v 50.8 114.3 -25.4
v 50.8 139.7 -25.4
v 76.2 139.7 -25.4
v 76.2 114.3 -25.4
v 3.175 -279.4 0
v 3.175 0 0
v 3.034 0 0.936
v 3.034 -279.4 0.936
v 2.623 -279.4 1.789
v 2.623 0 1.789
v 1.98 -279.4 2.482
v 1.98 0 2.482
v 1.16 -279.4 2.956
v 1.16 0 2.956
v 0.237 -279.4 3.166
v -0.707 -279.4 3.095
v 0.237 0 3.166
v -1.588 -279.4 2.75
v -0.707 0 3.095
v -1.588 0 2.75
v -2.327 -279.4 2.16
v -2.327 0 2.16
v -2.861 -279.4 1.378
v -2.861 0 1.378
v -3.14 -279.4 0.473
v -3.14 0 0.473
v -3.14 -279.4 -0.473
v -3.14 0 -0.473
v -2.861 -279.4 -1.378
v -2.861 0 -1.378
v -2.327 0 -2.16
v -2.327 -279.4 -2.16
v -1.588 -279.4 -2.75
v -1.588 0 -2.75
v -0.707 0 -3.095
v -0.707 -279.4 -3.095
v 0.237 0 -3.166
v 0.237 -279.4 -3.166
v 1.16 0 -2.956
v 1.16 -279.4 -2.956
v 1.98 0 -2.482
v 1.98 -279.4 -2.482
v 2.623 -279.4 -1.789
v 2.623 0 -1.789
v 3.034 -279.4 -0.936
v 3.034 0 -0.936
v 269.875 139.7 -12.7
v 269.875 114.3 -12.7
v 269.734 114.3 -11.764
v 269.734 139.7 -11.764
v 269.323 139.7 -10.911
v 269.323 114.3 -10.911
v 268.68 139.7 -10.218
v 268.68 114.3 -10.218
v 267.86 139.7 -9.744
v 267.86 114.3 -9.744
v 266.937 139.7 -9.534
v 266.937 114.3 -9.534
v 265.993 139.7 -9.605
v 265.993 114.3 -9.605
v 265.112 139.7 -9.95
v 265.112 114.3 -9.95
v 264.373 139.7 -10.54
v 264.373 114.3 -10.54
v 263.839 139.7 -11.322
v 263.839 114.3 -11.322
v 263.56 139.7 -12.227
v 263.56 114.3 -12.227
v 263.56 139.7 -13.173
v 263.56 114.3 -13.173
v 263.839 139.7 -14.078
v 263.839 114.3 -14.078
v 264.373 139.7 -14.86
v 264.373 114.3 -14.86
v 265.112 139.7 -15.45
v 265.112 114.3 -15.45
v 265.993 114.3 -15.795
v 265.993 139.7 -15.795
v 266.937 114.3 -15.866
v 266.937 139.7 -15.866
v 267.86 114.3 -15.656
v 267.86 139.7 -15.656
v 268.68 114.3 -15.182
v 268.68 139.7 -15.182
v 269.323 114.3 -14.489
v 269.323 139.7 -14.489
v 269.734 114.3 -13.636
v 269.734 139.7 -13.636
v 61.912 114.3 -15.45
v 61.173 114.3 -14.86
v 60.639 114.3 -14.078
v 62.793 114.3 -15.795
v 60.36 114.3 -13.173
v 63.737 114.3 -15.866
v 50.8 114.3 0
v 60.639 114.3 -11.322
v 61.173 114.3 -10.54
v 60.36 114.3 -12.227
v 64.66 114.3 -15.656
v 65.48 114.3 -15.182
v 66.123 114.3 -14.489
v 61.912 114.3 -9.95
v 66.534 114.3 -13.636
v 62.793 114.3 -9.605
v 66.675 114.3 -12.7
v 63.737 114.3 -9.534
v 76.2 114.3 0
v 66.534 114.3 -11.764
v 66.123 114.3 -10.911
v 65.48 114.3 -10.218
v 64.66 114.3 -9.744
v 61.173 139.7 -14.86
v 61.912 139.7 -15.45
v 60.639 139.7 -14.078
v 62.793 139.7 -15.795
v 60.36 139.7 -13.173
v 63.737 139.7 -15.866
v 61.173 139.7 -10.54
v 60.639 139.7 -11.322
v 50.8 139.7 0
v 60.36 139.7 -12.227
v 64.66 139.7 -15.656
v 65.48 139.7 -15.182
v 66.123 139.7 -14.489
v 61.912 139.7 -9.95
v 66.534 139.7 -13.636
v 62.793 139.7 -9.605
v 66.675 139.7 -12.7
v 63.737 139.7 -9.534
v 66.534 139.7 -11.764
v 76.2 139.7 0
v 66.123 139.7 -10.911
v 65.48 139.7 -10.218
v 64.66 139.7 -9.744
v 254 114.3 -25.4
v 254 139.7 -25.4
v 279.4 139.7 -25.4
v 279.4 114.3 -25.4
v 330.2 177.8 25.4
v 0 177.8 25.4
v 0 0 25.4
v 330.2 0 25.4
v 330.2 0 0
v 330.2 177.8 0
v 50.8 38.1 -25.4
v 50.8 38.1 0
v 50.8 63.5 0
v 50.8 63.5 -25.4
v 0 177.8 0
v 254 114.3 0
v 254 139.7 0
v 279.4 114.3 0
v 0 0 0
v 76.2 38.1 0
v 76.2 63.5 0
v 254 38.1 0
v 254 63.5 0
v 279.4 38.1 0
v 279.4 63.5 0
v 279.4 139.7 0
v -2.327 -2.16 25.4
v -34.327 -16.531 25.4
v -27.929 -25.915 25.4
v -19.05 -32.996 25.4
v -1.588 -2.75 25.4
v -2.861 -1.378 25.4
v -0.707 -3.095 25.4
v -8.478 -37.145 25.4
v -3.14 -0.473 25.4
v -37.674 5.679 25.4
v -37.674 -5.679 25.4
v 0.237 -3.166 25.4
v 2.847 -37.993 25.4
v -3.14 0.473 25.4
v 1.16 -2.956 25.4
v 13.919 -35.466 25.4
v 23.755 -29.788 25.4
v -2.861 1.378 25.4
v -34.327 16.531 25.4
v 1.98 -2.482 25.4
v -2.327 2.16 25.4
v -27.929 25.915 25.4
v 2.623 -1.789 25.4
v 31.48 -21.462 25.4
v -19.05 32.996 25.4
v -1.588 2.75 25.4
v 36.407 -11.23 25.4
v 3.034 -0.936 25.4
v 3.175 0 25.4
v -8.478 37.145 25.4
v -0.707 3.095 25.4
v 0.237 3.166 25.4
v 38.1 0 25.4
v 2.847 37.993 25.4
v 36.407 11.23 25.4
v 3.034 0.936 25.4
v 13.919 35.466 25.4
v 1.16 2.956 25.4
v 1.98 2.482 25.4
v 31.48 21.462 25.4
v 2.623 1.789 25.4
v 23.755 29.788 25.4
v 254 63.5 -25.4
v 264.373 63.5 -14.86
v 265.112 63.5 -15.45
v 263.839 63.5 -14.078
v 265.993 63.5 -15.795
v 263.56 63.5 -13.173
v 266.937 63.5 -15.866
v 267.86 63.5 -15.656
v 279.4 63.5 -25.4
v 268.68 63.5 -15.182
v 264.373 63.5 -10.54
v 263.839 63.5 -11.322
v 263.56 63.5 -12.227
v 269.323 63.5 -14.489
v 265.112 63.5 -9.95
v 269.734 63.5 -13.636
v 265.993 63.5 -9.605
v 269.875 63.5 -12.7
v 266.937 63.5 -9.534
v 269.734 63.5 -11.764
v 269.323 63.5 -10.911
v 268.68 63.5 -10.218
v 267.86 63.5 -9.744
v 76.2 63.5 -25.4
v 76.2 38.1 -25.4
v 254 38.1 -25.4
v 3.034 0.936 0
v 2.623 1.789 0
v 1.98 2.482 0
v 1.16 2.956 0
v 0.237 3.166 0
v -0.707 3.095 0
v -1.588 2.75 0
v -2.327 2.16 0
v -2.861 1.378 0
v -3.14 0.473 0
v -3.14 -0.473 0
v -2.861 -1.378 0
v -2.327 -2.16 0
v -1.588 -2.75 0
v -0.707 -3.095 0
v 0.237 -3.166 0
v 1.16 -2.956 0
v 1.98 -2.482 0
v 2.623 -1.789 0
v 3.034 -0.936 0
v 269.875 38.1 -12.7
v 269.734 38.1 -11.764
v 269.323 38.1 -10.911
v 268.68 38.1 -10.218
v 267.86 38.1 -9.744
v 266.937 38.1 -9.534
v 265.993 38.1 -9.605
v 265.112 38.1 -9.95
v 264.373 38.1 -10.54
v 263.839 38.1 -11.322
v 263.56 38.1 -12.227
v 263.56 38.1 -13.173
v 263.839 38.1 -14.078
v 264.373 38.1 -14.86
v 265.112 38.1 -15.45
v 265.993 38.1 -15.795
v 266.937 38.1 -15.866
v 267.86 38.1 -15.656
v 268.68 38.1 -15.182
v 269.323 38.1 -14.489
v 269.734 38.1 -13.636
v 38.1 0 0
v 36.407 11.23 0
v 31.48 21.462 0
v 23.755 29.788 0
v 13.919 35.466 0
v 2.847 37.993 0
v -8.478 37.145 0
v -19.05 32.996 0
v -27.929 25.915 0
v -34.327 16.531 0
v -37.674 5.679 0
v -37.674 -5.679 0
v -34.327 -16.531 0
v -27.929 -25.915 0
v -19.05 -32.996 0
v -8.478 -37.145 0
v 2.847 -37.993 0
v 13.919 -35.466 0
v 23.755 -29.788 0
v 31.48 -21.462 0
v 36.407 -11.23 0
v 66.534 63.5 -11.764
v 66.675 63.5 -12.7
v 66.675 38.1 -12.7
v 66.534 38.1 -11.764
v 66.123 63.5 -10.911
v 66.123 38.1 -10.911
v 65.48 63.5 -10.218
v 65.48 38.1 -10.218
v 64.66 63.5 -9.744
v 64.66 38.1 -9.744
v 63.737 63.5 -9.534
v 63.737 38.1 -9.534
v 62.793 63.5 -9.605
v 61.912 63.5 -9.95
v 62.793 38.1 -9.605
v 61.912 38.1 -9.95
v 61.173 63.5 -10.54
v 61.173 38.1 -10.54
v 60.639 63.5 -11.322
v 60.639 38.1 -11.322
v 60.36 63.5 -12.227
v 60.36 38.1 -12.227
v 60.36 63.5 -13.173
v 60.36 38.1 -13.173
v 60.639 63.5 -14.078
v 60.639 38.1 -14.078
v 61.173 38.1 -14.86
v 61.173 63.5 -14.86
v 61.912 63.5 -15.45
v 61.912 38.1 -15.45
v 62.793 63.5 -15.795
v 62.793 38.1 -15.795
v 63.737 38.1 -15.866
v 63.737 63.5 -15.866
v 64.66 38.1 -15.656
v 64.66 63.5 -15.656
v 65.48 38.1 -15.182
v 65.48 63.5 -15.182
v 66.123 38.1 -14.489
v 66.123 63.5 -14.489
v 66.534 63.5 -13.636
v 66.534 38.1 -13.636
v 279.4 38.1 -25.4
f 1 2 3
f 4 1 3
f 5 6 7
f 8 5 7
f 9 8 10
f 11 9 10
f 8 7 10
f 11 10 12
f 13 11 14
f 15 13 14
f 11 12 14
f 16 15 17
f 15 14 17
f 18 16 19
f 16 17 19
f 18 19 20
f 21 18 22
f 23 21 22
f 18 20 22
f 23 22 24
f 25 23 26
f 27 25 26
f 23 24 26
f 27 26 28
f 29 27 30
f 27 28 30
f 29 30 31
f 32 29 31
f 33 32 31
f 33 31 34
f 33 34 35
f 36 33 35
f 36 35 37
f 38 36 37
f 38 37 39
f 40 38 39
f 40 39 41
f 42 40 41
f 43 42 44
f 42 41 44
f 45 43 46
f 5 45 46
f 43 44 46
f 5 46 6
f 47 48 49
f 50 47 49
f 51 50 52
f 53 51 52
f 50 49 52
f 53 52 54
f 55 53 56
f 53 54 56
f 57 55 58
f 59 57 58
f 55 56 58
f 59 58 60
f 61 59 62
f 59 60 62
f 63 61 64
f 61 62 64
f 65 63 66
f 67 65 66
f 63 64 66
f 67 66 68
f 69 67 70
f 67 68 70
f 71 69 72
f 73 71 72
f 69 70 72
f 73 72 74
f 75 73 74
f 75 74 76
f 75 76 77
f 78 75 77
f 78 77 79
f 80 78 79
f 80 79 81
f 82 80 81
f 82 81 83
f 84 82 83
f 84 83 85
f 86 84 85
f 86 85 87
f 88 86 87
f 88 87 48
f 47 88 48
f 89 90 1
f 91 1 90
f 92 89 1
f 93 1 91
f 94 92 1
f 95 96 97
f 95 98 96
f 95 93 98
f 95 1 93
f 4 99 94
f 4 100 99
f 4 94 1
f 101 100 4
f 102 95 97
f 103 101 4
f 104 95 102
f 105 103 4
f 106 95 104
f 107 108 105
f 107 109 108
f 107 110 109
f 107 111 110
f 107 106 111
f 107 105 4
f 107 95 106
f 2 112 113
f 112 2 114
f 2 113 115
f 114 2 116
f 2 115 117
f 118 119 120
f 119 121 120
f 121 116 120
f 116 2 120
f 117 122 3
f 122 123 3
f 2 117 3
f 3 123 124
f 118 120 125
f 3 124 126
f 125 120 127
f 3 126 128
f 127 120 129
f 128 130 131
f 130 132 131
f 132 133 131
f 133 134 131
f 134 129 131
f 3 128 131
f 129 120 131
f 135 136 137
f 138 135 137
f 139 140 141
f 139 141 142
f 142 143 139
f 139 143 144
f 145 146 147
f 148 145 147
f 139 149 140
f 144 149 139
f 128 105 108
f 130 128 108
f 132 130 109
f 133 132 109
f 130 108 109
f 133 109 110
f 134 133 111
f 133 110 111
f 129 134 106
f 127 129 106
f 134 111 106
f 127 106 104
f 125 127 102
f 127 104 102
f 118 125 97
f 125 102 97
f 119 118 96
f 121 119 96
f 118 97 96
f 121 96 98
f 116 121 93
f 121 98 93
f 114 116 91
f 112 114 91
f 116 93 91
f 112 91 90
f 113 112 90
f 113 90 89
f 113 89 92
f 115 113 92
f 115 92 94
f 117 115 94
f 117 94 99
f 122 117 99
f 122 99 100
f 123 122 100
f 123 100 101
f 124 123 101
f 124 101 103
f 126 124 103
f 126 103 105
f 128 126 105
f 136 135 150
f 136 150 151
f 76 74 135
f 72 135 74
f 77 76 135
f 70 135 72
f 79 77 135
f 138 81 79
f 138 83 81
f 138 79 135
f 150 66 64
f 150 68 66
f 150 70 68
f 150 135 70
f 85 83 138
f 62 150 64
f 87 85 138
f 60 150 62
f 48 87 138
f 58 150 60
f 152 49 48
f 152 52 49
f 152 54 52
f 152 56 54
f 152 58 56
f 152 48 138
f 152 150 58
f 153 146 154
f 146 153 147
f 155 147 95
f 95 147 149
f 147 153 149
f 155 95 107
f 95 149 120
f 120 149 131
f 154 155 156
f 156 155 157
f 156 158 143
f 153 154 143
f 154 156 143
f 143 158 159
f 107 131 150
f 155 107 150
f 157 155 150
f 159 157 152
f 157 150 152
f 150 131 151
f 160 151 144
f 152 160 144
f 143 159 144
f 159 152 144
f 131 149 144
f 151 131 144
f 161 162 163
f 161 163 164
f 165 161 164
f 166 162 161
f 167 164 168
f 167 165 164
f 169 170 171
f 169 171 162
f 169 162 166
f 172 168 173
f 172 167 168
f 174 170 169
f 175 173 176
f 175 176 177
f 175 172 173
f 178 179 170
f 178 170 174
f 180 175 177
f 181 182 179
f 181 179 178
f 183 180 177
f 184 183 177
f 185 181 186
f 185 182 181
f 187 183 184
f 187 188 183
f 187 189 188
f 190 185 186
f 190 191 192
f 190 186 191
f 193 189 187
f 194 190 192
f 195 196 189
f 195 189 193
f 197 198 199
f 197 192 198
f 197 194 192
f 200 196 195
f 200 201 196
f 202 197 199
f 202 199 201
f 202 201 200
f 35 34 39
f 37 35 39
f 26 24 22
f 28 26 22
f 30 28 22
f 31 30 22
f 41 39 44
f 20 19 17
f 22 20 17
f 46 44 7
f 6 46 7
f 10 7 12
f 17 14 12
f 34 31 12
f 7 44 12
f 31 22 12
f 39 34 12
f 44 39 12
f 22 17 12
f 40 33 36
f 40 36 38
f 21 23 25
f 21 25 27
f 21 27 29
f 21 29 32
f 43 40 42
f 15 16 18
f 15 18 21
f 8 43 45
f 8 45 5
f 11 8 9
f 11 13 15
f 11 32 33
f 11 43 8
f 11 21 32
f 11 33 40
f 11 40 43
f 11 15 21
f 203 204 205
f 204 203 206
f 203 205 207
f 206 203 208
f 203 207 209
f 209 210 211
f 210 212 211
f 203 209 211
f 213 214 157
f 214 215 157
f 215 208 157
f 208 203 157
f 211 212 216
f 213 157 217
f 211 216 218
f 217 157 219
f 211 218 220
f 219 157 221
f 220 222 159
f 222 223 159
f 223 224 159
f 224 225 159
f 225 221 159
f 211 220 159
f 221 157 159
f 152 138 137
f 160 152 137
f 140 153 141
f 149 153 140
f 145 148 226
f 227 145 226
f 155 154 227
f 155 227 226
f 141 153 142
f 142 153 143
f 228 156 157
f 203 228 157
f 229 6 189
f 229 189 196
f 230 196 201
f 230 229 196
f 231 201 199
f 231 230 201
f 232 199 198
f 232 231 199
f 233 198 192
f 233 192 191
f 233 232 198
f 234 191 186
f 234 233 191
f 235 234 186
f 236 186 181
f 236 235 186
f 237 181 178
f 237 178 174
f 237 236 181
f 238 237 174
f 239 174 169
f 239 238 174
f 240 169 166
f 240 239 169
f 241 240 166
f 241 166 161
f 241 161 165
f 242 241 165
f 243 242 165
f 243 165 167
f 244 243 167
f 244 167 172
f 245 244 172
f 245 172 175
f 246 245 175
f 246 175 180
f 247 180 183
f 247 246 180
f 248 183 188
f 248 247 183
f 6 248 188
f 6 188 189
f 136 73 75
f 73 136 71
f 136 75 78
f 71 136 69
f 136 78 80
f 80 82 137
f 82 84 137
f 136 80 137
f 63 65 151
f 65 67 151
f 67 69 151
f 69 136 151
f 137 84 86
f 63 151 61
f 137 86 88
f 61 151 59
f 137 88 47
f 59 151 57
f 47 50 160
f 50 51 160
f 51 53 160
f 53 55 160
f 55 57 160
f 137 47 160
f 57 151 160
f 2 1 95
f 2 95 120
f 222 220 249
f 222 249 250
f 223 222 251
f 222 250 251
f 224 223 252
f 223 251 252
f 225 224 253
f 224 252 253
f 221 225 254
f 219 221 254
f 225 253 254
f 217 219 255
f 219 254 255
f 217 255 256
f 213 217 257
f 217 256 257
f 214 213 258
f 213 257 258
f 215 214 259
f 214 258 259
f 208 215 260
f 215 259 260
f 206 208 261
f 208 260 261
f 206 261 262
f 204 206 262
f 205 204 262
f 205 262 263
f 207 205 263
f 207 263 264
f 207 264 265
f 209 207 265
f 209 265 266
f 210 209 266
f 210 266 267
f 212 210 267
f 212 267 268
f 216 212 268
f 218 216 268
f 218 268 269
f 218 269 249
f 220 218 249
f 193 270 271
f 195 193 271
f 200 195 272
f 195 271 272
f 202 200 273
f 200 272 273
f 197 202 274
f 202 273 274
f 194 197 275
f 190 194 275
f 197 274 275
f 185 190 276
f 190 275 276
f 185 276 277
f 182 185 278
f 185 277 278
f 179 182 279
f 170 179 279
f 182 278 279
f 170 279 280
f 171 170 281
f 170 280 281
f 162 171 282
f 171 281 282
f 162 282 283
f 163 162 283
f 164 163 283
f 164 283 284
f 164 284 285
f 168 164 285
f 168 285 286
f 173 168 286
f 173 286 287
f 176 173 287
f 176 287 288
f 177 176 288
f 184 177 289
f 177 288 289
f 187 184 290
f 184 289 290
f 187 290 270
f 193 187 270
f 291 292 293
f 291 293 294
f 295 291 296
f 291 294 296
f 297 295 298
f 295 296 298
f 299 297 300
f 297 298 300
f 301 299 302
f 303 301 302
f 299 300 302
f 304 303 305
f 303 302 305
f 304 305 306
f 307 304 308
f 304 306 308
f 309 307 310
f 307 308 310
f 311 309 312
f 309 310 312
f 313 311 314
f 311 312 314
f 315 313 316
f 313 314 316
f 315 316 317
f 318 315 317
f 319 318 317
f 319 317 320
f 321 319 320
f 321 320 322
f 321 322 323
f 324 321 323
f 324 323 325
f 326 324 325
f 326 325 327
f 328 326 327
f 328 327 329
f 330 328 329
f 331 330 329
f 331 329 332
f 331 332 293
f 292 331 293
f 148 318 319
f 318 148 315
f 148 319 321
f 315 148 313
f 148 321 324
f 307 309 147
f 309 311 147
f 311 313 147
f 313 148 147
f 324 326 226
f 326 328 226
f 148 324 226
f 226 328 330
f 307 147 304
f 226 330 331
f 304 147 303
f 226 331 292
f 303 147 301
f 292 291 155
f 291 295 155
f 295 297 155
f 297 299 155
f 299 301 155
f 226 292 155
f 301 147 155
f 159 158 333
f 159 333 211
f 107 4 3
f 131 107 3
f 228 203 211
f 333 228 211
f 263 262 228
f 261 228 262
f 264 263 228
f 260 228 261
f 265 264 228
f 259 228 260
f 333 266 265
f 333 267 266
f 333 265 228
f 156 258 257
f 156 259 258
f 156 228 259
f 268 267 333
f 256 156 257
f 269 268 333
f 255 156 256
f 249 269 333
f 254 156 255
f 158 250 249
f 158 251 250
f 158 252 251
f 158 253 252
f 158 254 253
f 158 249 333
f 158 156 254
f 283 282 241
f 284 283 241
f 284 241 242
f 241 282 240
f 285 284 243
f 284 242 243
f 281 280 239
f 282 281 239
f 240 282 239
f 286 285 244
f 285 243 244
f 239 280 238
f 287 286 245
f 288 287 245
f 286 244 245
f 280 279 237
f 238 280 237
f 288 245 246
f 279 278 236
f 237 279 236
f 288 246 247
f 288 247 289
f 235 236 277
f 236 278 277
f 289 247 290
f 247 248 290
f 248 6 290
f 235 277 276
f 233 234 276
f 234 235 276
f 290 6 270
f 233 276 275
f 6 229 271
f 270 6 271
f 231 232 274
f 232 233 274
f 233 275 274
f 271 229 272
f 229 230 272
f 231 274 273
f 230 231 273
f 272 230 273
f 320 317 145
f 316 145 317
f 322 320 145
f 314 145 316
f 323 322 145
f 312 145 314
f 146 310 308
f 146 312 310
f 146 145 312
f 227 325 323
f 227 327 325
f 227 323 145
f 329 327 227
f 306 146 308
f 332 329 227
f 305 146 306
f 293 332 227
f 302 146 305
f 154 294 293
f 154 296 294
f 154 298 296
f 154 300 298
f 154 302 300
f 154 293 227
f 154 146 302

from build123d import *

# Parameters (mm, degrees)
F0_W     = 330.2
F0_H     = 177.8
F1_DEPTH = 25.4
F2_R     = 38.1
F2_R_2   = 3.175
F3_DEPTH = 25.4
F4_R     = 3.175
F5_DEPTH = 279.4
F6_W     = 25.4
F6_H     = 25.4
F7_DEPTH = 25.4
F8_R     = 3.175
F9_DEPTH = 139.701


with BuildPart() as f1:
    # F0 (on Top) → F1 (new body)
    with BuildSketch(Plane.XY):
        with Locations((165.1, 88.9)):
            Rectangle(F0_W, F0_H)
    extrude(amount=F1_DEPTH)

    # F6 (on Top) → F7 (join)
    with BuildSketch(Plane.XY):
        with Locations((63.5, 50.8)):
            Rectangle(F6_W, F6_H)
        with Locations((63.5, 127)):
            Rectangle(F6_W, F6_H)
        with Locations((266.7, 127)):
            Rectangle(F6_W, F6_H)
        with Locations((266.7, 50.8)):
            Rectangle(F6_W, F6_H)
    extrude(amount=-F7_DEPTH)

    # F8 (on face) → F9 (cut, through all)
    with BuildSketch(Plane.XZ.offset(-38.1)):
        with Locations((63.5, -12.7)):
            Circle(F8_R)
        with Locations((266.7, -12.7)):
            Circle(F8_R)
    extrude(amount=-F9_DEPTH, mode=Mode.SUBTRACT)


with BuildPart() as f3:
    # F2 (on Top) → F3 (new body)
    with BuildSketch(Plane.XY):
        Circle(F2_R)
        Circle(F2_R_2, mode=Mode.SUBTRACT)
    extrude(amount=F3_DEPTH)


with BuildPart() as f5:
    # F4 (on Front) → F5 (new body)
    with BuildSketch(Plane.XZ):
        Circle(F4_R)
    extrude(amount=F5_DEPTH)


solid = Compound([f1.part, f3.part, f5.part])
